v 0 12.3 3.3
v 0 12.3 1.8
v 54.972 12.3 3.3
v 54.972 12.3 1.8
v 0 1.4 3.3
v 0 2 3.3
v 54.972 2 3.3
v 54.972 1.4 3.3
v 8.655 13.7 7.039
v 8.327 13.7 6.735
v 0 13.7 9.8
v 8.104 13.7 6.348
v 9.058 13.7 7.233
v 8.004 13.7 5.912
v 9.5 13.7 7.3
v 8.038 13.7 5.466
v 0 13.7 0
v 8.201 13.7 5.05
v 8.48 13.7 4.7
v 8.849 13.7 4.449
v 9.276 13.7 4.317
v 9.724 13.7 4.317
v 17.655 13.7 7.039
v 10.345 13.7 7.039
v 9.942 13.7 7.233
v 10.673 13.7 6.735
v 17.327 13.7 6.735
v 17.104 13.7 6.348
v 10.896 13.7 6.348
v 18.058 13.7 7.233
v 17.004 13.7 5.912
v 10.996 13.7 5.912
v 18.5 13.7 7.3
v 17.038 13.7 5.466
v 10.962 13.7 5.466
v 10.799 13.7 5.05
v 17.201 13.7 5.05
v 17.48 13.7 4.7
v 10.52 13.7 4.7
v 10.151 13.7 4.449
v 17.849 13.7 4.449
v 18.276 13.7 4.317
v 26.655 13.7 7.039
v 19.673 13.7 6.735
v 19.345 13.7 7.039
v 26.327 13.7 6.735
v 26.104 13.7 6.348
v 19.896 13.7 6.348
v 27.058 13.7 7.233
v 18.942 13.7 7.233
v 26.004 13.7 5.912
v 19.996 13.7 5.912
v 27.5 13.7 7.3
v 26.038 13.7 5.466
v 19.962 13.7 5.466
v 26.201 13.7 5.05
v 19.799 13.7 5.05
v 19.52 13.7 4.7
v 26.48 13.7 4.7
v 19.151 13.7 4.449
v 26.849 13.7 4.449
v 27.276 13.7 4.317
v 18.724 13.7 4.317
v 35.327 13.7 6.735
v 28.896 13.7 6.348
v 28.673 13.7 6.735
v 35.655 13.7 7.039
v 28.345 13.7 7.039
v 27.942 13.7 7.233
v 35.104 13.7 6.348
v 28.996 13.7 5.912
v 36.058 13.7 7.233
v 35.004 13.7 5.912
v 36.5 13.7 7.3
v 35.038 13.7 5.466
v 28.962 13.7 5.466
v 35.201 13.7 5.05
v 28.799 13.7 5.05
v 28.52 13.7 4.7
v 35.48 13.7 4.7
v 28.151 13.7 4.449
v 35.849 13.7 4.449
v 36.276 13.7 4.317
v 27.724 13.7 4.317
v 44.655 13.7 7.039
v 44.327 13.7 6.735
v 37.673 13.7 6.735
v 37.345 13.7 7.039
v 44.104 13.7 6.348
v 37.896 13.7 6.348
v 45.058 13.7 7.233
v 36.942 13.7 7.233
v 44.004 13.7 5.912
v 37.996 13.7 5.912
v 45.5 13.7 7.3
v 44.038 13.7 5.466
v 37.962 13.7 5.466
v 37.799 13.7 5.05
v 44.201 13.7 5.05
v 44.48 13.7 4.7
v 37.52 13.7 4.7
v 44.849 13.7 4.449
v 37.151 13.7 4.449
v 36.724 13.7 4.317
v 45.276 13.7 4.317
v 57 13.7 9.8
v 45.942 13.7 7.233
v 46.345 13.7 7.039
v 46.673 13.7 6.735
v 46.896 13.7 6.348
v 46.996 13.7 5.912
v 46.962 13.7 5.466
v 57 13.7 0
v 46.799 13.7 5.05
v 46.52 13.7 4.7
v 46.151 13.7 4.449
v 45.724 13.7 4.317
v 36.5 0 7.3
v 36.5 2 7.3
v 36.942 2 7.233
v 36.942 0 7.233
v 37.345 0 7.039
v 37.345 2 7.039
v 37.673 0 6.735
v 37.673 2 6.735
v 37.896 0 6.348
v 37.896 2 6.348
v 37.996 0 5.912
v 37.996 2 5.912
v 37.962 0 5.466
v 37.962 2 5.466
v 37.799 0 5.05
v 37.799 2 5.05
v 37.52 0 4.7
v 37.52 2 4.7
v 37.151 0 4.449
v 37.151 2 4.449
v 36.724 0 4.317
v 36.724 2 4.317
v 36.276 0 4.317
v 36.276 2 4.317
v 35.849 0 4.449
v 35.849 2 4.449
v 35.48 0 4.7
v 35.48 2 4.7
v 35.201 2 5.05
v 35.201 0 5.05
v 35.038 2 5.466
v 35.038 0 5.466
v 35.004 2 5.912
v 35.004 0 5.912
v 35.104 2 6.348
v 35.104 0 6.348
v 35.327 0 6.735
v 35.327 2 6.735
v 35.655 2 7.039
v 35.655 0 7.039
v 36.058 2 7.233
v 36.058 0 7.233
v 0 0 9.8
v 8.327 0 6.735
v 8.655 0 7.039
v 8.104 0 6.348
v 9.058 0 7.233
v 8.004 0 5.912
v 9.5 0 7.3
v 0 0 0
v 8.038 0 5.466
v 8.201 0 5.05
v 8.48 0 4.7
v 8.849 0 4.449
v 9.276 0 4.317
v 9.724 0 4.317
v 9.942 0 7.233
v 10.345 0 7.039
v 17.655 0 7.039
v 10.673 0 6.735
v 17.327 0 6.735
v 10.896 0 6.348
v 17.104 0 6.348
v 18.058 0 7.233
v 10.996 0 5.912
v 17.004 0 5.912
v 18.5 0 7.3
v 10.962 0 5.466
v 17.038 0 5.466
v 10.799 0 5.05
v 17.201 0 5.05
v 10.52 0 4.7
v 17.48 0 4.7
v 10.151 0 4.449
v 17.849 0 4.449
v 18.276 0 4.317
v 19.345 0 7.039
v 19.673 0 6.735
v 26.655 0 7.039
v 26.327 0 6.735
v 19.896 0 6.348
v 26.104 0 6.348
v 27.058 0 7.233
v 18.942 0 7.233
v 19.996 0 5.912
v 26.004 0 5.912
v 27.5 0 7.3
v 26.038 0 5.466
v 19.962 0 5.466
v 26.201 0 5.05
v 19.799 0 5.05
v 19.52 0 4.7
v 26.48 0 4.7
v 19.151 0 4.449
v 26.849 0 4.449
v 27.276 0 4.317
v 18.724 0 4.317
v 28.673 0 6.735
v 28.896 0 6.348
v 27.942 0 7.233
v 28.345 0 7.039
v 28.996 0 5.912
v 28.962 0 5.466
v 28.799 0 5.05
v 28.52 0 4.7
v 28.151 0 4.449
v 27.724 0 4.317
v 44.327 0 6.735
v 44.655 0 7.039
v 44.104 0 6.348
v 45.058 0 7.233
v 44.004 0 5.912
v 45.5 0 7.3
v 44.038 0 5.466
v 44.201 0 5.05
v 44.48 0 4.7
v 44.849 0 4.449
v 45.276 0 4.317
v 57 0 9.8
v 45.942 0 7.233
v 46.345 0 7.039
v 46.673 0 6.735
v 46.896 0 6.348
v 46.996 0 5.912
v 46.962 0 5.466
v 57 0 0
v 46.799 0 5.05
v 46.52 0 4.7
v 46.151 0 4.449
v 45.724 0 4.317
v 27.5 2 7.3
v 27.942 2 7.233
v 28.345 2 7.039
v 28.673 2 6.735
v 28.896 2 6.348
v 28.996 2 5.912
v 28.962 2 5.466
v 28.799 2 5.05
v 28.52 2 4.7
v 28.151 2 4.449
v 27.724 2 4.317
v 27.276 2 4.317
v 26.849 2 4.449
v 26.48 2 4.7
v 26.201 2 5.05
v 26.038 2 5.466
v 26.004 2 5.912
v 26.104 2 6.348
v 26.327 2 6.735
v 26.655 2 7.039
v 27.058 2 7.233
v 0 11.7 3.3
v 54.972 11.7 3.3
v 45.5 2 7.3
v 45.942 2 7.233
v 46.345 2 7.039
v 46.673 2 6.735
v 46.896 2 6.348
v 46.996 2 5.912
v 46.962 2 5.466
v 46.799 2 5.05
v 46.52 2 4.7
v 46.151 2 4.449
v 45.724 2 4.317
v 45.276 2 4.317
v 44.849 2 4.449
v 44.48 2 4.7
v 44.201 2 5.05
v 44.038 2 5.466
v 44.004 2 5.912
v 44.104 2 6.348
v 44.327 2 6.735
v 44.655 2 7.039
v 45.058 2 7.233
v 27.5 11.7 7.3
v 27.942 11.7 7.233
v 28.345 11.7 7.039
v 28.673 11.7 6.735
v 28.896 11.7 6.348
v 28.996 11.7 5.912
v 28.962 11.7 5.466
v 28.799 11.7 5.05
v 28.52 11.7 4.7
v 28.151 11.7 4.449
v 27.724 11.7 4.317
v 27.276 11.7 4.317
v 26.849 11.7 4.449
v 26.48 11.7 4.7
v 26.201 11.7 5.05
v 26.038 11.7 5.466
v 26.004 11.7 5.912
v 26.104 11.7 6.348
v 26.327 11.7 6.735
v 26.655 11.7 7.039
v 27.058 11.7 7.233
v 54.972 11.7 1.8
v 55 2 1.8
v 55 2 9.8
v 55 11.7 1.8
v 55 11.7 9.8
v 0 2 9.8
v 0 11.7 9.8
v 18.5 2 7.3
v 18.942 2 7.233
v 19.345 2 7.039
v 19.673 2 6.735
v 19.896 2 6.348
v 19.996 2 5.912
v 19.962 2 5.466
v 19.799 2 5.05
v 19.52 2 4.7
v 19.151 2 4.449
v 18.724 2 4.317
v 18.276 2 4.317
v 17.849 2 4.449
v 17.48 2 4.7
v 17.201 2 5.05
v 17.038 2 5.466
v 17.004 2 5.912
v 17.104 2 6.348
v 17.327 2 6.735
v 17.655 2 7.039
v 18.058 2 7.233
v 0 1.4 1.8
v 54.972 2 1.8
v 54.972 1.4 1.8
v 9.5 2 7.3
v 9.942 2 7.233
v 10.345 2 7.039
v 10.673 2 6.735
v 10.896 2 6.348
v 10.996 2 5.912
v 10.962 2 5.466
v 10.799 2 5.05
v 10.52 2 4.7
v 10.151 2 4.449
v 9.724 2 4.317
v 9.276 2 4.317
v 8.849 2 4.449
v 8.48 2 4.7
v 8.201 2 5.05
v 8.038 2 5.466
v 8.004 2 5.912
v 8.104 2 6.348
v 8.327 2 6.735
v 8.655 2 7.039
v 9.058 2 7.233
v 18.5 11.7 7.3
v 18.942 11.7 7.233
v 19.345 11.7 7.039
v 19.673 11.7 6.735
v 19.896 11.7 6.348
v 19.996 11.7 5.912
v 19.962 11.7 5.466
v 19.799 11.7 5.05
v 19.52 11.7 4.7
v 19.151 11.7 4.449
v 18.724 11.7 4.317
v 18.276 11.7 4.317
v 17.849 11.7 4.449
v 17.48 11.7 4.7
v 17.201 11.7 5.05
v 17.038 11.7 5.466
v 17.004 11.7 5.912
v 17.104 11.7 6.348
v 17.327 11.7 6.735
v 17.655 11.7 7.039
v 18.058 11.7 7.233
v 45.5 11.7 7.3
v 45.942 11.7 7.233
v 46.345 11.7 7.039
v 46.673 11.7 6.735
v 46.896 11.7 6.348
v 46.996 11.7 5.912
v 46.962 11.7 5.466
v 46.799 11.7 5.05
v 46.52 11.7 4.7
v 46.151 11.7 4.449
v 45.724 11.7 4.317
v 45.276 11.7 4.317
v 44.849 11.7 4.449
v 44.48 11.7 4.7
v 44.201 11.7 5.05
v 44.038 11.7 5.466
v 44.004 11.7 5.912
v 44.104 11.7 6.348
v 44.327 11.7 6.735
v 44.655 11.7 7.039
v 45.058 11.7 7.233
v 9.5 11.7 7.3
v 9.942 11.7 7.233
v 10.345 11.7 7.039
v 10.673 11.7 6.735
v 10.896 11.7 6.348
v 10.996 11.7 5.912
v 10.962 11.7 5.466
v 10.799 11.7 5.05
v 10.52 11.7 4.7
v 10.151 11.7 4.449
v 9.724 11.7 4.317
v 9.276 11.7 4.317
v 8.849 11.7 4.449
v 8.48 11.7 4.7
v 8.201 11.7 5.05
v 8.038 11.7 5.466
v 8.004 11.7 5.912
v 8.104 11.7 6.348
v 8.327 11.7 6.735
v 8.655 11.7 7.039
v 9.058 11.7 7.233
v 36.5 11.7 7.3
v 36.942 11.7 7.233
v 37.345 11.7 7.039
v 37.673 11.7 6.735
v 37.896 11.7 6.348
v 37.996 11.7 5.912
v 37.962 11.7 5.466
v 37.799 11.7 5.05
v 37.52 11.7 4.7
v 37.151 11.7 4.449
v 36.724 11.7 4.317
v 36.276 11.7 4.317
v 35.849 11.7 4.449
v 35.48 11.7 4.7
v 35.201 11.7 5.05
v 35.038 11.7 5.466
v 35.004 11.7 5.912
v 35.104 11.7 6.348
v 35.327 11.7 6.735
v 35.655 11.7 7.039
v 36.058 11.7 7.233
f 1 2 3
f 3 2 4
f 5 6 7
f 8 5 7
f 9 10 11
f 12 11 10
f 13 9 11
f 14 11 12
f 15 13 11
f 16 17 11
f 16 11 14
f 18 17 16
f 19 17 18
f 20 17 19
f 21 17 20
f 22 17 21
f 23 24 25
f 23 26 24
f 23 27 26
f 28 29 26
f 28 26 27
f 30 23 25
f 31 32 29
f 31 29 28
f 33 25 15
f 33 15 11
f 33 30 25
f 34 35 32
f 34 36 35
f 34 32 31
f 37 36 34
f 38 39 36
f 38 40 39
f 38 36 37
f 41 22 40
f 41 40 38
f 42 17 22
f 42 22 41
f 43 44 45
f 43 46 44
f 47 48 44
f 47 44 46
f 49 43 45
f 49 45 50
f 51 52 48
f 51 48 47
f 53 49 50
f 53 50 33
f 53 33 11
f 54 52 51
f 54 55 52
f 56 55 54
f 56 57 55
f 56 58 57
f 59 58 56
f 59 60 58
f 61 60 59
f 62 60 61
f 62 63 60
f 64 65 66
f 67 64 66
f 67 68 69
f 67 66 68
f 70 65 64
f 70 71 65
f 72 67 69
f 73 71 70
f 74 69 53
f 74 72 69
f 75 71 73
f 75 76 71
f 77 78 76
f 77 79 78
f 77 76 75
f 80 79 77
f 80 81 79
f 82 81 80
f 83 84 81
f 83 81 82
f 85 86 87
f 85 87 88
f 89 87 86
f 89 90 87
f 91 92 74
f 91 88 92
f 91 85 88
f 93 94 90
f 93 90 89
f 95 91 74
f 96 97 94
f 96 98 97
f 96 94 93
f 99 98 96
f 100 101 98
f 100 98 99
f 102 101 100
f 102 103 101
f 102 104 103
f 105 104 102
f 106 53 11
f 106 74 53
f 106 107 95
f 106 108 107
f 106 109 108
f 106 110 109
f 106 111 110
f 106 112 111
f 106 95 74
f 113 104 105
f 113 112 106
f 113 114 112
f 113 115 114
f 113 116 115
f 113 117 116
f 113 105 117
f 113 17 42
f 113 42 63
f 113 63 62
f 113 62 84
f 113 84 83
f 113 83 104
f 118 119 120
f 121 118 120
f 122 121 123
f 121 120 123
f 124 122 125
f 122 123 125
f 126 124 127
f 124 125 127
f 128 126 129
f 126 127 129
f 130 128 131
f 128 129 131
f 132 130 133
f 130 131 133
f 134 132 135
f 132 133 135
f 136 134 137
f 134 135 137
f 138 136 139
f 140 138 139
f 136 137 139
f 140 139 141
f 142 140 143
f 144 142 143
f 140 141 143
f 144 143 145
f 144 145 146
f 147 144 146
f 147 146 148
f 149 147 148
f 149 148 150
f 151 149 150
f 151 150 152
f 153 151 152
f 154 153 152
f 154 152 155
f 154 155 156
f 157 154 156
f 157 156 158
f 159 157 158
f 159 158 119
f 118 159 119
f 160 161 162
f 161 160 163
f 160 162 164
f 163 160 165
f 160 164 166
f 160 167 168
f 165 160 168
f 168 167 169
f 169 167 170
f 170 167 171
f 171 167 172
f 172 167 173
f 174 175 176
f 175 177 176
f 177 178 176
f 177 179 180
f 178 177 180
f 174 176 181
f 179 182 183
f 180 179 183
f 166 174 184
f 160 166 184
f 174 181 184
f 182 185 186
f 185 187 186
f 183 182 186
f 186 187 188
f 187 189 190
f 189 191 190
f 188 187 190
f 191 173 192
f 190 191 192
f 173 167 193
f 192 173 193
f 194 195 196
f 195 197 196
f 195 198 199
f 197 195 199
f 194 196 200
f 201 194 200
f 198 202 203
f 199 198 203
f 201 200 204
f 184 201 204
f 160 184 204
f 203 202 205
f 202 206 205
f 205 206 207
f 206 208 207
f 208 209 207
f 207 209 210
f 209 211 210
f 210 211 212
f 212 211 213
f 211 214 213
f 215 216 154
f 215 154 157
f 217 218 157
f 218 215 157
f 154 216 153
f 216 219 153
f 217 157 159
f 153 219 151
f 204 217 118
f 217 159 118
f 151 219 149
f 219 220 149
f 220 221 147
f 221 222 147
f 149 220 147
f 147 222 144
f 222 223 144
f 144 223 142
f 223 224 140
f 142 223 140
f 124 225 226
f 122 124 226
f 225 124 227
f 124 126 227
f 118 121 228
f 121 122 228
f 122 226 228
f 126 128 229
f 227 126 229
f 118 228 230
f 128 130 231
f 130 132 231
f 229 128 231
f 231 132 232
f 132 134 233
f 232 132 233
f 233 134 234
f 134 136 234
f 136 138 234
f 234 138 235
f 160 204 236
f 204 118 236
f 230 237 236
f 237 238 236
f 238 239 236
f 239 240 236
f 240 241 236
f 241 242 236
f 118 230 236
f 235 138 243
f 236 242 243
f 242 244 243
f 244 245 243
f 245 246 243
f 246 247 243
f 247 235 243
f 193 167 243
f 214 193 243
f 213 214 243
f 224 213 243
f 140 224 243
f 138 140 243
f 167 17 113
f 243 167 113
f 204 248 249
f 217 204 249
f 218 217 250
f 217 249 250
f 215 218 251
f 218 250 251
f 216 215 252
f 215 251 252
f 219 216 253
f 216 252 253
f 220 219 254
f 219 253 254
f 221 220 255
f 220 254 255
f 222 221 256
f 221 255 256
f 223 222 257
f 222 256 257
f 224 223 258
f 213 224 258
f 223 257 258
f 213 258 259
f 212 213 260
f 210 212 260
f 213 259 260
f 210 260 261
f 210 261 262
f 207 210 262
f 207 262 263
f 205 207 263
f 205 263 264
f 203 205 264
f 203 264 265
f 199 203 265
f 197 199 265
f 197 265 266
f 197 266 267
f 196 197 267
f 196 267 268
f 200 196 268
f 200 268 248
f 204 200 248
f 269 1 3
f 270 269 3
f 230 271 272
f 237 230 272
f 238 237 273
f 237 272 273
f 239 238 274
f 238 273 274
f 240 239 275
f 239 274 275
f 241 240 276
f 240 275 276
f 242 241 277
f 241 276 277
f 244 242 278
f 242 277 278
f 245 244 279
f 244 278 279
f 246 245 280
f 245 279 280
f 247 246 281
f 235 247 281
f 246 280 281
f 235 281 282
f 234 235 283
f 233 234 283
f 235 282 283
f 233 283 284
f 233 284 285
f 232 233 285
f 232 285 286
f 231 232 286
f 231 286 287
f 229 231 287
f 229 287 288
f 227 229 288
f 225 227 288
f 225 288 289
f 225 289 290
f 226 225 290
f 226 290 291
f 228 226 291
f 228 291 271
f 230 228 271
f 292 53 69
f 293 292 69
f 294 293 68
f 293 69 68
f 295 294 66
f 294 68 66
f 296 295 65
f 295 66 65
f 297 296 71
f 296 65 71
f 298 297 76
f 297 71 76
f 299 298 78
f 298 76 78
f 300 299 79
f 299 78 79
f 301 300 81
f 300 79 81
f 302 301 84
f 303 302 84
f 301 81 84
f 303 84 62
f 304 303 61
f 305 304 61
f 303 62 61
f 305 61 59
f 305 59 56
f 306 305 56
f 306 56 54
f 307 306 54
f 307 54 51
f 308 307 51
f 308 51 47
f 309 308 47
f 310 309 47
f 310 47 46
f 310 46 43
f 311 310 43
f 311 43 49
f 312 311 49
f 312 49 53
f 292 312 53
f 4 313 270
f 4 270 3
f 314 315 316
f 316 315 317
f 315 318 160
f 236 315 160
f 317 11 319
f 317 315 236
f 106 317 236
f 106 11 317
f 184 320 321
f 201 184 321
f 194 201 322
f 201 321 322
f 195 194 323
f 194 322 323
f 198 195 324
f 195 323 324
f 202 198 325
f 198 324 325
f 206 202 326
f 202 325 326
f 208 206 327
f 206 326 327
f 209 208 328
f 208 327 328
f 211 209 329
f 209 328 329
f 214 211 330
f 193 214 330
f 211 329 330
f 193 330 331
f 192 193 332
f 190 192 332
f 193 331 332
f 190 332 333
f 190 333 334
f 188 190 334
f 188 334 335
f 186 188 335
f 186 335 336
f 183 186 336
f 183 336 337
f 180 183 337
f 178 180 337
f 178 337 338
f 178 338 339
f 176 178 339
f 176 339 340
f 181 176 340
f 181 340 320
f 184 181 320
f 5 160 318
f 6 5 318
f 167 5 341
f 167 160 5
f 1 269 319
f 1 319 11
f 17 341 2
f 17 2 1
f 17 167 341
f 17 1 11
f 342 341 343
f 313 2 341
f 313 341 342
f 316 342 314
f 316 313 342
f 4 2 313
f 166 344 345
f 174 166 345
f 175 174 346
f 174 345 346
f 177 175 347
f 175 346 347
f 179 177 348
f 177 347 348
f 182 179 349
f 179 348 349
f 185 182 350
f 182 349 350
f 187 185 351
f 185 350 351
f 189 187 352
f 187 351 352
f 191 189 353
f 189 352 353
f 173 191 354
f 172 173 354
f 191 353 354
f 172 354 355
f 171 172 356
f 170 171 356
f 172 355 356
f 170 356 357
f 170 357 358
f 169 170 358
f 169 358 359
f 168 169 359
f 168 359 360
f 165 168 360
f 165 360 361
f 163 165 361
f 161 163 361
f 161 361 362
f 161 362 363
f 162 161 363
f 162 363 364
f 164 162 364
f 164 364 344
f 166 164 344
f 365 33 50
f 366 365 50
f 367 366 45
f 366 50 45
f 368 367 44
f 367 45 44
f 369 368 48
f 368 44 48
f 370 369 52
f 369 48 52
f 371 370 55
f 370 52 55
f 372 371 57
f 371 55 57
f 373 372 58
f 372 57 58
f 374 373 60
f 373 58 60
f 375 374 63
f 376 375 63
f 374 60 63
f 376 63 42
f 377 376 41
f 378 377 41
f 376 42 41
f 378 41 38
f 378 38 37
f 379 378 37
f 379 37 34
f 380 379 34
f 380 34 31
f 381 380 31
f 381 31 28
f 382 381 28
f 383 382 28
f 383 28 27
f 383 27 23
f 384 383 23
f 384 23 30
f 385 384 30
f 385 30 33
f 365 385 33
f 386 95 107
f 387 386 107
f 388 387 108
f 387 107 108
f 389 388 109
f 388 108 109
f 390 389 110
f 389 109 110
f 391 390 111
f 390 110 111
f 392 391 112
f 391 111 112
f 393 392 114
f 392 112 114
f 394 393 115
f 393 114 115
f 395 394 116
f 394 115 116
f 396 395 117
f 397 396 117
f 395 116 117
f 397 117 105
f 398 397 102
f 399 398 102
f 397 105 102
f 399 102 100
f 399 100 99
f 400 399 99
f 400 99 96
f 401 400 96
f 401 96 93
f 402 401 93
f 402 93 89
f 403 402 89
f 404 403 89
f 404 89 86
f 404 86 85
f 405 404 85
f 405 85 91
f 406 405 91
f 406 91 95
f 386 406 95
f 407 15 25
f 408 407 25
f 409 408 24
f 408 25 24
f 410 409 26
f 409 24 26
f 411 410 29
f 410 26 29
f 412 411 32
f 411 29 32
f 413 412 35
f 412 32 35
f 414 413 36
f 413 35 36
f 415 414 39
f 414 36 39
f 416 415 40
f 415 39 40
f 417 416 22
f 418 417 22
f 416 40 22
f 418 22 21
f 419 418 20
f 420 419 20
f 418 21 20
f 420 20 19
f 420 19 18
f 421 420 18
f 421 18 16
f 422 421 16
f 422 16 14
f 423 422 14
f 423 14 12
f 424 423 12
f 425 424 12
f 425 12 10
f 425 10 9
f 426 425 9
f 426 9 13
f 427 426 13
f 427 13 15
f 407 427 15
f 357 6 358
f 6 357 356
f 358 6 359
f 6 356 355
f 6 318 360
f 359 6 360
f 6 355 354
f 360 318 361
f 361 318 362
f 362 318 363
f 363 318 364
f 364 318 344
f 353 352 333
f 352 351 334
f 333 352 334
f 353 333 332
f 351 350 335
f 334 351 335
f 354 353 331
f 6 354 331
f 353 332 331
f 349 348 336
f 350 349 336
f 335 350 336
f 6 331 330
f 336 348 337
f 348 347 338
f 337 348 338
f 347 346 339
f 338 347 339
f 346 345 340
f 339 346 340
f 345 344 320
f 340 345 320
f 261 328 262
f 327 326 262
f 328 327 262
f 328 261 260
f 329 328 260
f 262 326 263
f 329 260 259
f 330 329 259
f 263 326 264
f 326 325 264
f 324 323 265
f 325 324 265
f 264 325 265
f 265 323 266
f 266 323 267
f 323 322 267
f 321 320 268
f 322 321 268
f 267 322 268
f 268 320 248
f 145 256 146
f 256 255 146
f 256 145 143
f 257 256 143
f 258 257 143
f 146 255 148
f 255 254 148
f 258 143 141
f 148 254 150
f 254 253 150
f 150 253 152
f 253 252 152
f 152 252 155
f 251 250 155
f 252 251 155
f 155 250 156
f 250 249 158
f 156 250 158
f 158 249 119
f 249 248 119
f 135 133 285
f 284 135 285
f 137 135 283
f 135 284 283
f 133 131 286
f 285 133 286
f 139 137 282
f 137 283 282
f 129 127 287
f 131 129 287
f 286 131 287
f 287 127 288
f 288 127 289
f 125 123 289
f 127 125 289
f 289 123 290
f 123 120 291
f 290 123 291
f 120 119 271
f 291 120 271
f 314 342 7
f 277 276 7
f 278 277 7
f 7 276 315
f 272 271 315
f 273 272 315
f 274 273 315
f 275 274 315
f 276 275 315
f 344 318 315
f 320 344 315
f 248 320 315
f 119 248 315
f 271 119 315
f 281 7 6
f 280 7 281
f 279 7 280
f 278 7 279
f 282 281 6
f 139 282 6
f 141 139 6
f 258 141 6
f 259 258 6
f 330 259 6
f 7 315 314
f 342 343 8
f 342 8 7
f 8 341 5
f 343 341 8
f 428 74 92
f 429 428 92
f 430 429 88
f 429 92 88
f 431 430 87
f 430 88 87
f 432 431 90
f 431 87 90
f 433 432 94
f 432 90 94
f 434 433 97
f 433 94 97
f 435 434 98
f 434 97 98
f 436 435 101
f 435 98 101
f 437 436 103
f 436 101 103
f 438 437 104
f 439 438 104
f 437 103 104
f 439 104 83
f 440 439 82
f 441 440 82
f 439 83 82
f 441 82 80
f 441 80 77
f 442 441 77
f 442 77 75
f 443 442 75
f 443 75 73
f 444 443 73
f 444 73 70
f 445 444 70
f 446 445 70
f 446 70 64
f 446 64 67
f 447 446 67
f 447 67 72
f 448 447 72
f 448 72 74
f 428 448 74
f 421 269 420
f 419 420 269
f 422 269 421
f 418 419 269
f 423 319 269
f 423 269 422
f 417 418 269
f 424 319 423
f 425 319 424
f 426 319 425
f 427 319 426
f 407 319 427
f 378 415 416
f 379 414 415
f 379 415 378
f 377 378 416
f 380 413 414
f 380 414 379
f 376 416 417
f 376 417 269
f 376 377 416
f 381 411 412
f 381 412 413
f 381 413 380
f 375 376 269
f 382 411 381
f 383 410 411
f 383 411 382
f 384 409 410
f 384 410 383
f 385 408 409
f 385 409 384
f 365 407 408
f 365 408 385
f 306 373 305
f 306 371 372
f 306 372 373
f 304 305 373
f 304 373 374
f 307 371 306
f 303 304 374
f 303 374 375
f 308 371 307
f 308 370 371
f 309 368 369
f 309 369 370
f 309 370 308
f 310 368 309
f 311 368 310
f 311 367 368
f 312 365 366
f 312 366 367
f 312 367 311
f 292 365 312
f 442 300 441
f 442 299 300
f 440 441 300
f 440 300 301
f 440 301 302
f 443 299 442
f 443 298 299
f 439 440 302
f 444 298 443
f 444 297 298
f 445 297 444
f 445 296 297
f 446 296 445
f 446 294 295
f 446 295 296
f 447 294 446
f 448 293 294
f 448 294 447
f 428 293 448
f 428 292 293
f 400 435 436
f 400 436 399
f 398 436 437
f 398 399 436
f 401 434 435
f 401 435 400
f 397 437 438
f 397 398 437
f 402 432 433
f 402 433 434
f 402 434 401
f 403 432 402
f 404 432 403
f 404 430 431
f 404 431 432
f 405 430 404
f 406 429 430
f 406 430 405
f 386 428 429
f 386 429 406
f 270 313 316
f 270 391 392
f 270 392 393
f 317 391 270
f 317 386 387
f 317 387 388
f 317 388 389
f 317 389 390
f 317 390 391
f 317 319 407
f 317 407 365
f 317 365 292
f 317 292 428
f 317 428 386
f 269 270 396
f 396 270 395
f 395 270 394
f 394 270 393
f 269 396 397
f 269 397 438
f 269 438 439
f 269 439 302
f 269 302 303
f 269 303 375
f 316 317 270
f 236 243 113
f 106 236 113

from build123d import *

# Parameters (mm, degrees)
SKETCH_1_W          = 57
SKETCH_1_H          = 13.7
EXTRUDE_1_DEPTH     = 9.8
SKETCH_2_W          = 55
SKETCH_2_H          = 9.7
CUT_EXTRUDE_1_DEPTH = 8
SKETCH_3_W          = 54.972087022
SKETCH_3_H          = 0.6
CUT_EXTRUDE_2_DEPTH = 1.5
SKETCH_4_R          = 1.5
CUT_EXTRUDE_3_DEPTH = 14


with BuildPart() as part:
    # Эскиз1 → Бобышка-Вытянуть1 (new body)
    with BuildSketch(Plane.XY):
        with Locations((28.5, 6.85)):
            Rectangle(SKETCH_1_W, SKETCH_1_H)
    extrude(amount=EXTRUDE_1_DEPTH)

    # Эскиз2 → Вырез-Вытянуть1 (cut)
    with BuildSketch(Plane.XY.offset(9.8)):
        with Locations((27.5, 6.85)):
            Rectangle(SKETCH_2_W, SKETCH_2_H)
    extrude(amount=-CUT_EXTRUDE_1_DEPTH, mode=Mode.SUBTRACT)

    # Эскиз3 → Вырез-Вытянуть2 (cut)
    with BuildSketch(Plane.XY.offset(1.8)):
        with Locations((27.486043511, 12)):
            Rectangle(SKETCH_3_W, SKETCH_3_H)
        with Locations((27.486043511, 1.7)):
            Rectangle(SKETCH_3_W, SKETCH_3_H)
    extrude(amount=CUT_EXTRUDE_2_DEPTH, mode=Mode.SUBTRACT)

    # Эскиз4 → Вырез-Вытянуть3 (cut)
    with BuildSketch(Plane(origin=(0, 13.7, 0), x_dir=(1, 0, 0), z_dir=(0, 1, 0))):
        with Locations(Location((45.5, -5.8, 0), (0, 0, 270))):
            Circle(SKETCH_4_R)
        with Locations(Location((36.5, -5.8, 0), (0, 0, 270))):
            Circle(SKETCH_4_R)
        with Locations(Location((27.5, -5.8, 0), (0, 0, 270))):
            Circle(SKETCH_4_R)
        with Locations(Location((18.5, -5.8, 0), (0, 0, 270))):
            Circle(SKETCH_4_R)
        with Locations(Location((9.5, -5.8, 0), (0, 0, 270))):
            Circle(SKETCH_4_R)
    extrude(amount=-CUT_EXTRUDE_3_DEPTH, mode=Mode.SUBTRACT)


solid = part.part
